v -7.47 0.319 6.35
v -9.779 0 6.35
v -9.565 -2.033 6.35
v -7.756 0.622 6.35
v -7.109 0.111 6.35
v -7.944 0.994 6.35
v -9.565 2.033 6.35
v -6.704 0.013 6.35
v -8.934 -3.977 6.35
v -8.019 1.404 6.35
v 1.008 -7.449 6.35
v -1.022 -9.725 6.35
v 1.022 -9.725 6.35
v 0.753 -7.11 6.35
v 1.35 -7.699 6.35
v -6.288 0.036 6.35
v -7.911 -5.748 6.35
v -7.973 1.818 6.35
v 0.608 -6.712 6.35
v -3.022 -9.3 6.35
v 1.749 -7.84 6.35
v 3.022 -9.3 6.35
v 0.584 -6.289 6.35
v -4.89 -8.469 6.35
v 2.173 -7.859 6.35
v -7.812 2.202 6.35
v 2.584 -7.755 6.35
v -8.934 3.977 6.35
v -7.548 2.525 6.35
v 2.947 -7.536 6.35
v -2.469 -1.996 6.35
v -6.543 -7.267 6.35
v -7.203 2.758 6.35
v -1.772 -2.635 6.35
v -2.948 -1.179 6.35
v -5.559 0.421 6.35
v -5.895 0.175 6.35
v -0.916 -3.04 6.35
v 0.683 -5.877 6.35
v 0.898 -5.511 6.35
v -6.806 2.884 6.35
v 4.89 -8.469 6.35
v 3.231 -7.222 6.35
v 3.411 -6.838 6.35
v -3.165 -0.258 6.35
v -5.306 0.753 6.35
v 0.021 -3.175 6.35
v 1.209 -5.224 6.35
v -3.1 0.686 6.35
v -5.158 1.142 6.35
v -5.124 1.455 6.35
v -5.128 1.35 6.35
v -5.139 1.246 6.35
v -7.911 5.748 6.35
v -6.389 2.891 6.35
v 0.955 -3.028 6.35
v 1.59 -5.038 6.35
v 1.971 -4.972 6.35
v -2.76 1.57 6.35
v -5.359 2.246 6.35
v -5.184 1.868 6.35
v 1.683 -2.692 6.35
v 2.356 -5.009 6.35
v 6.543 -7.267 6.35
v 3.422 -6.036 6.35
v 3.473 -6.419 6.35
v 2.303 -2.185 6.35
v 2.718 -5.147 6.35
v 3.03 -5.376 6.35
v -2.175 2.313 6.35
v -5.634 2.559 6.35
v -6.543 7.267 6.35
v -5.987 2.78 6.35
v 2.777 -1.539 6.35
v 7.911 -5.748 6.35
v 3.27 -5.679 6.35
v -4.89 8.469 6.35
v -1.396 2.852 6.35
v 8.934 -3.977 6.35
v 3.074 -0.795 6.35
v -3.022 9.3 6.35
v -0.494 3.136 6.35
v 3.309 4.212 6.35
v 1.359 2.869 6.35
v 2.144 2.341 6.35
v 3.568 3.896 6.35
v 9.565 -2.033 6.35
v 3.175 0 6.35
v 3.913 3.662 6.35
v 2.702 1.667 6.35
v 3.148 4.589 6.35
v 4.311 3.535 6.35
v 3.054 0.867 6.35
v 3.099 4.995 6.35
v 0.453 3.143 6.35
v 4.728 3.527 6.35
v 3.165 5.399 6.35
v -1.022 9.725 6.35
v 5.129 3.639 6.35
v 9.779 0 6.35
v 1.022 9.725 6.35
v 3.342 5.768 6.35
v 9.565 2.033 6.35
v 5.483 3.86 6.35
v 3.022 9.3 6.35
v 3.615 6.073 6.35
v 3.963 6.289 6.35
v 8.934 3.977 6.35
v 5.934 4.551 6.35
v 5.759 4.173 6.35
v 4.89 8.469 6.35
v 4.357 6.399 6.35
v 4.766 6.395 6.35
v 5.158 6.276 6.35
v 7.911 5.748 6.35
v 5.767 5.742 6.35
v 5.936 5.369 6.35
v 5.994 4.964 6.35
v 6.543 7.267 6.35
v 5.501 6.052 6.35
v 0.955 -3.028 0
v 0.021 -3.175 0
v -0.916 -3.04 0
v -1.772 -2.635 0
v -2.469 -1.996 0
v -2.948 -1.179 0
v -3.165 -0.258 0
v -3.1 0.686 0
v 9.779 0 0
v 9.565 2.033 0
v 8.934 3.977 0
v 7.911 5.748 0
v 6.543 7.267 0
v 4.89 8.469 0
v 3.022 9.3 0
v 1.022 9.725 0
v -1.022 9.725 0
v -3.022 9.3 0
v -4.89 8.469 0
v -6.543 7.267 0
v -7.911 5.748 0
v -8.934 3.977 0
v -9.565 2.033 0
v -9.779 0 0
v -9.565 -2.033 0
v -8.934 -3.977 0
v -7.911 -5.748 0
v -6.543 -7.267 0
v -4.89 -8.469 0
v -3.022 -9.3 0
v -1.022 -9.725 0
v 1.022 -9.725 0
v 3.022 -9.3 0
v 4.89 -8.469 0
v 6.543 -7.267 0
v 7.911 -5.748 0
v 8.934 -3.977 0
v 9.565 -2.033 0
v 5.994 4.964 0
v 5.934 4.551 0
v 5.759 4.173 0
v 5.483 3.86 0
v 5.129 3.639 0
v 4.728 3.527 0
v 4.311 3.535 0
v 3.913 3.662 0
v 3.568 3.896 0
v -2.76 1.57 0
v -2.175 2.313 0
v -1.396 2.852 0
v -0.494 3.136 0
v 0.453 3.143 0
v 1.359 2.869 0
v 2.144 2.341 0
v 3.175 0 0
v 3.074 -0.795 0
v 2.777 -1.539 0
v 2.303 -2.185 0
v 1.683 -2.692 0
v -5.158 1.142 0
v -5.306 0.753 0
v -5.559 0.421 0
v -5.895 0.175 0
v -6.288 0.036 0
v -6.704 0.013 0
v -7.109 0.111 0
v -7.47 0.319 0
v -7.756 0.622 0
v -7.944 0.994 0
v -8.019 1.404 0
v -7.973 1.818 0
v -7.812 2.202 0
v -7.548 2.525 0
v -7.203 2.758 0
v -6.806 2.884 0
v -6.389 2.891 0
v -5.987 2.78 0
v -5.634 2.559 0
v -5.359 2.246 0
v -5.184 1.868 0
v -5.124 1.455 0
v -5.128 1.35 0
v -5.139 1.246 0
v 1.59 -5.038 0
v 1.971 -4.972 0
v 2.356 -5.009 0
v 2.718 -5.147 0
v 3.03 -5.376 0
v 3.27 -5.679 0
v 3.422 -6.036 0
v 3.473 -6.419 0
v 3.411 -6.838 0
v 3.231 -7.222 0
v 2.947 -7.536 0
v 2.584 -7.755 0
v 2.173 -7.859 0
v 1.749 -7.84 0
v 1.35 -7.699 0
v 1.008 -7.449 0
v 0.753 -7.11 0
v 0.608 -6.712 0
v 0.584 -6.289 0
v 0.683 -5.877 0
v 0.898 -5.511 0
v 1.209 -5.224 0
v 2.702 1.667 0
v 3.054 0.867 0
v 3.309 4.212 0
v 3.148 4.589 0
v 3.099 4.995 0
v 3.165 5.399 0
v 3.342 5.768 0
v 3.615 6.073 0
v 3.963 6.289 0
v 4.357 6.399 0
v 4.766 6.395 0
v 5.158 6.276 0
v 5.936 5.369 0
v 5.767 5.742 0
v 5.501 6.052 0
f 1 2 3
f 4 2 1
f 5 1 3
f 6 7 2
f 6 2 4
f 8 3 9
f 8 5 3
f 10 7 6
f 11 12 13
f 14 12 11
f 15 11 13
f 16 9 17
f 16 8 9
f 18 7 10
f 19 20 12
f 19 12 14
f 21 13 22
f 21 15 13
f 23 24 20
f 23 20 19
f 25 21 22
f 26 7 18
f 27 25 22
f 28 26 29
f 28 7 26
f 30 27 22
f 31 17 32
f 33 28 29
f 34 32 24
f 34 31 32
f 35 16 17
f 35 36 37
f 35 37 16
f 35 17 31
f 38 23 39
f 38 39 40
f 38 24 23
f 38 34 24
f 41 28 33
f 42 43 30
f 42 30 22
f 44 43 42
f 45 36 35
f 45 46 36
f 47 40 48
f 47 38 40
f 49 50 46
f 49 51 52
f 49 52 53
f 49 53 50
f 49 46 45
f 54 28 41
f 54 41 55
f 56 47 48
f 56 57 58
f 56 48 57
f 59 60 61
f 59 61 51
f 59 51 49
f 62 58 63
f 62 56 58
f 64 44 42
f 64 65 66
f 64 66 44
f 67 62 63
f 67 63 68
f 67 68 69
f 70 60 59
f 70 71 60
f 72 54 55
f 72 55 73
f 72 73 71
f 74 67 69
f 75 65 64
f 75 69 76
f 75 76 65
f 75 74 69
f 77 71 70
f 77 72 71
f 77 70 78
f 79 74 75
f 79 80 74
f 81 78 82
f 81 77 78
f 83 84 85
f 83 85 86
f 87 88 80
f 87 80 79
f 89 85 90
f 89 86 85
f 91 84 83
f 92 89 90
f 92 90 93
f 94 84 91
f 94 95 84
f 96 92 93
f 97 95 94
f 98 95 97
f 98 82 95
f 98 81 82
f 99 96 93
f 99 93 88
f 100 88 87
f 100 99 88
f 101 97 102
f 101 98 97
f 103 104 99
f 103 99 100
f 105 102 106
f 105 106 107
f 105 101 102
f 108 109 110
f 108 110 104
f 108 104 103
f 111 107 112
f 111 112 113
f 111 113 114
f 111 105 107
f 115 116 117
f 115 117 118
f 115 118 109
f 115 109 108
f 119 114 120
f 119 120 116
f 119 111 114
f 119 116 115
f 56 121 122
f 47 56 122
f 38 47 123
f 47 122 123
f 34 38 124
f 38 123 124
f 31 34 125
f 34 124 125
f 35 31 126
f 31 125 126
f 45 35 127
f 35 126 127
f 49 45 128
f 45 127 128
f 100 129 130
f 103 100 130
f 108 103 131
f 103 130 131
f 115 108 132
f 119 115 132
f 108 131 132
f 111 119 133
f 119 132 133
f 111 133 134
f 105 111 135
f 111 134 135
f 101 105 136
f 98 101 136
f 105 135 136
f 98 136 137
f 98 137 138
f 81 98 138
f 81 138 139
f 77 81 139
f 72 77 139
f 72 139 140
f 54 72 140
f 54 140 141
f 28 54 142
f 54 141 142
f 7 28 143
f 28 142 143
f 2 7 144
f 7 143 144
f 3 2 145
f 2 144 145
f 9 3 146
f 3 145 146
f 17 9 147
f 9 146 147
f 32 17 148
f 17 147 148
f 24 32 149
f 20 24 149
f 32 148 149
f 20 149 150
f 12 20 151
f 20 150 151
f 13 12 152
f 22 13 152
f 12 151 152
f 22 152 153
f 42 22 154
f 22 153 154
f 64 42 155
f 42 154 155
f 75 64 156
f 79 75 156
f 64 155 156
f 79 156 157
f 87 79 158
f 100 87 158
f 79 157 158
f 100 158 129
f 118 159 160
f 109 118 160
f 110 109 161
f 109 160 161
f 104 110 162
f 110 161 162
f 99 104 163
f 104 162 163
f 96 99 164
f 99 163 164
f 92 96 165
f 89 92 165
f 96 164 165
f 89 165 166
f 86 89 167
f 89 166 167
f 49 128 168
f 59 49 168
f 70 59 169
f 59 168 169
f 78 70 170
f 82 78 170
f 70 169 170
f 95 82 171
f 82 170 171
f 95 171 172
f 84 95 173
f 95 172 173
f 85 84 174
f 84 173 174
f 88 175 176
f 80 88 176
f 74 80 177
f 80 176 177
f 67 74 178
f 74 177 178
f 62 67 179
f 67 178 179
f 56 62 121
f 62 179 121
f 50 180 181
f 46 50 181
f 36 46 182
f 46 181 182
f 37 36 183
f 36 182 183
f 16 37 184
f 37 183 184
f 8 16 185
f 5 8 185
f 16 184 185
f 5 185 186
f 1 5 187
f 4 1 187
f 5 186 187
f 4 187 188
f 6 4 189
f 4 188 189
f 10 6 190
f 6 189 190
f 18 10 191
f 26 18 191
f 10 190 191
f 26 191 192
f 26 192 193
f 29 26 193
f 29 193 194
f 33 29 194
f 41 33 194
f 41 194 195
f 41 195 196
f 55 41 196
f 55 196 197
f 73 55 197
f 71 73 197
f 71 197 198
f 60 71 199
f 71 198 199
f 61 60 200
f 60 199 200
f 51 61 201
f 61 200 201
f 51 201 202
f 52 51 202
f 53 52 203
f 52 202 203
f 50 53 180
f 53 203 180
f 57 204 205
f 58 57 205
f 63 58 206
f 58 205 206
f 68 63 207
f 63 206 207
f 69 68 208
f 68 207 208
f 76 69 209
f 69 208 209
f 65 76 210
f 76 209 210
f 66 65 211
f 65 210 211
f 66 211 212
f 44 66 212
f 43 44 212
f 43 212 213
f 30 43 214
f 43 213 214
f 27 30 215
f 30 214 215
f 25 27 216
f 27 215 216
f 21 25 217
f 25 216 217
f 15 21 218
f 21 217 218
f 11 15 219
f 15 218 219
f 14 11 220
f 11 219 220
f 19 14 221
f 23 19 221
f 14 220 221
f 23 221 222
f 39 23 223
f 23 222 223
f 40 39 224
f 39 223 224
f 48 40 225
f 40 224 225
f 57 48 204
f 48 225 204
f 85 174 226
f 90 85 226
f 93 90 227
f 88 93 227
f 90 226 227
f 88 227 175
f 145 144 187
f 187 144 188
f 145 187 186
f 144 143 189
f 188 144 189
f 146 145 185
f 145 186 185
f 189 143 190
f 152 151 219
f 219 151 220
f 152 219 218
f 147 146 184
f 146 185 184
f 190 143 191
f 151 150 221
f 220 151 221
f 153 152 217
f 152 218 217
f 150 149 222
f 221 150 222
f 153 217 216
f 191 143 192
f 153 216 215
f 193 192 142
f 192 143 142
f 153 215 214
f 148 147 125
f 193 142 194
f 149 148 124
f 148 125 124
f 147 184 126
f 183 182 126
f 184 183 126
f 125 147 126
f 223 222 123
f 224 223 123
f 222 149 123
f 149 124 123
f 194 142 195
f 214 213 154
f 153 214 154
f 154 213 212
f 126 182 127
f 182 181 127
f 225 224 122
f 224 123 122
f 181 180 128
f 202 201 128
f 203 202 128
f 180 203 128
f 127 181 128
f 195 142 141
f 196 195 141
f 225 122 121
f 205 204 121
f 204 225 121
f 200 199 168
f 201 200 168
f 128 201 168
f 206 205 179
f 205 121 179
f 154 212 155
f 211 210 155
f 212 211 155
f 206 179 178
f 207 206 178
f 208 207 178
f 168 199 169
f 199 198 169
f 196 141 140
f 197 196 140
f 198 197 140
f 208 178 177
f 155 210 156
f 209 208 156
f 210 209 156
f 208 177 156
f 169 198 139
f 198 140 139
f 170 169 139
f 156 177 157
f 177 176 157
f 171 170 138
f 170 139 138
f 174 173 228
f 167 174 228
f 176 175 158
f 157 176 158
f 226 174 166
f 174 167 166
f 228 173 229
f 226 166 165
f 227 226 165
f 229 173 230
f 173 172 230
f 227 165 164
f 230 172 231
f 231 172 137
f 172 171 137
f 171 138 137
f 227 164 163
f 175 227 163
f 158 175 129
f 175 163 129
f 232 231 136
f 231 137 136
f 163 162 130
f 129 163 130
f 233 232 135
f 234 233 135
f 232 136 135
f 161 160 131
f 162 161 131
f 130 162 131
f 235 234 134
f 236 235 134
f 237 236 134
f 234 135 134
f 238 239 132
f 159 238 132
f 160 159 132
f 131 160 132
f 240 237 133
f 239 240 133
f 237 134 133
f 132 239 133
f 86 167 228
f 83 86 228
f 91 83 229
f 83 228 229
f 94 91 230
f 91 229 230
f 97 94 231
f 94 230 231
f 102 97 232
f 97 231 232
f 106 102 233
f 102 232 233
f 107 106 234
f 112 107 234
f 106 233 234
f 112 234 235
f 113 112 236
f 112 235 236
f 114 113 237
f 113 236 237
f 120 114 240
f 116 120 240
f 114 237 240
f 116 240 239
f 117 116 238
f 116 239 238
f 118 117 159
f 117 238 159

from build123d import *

# Parameters (mm, degrees)
F0_R     = 9.779
F1_DEPTH = 6.35


with BuildPart() as f1:
    # F0 (on Top) → F1 (new body)
    with BuildSketch(Plane.XY):
        Circle(F0_R)
        with BuildLine():
            ThreePointArc((3.473407, -6.418978), (1.16965, -7.586652), (1.58991, -5.038292))
            ThreePointArc((1.58991, -5.038292), (2.881563, -5.251304), (3.473407, -6.418978))
        make_face(mode=Mode.SUBTRACT)
        with BuildLine():
            ThreePointArc((-5.124001, 1.455262), (-5.132588, 1.297819), (-5.158244, 1.142243))
            ThreePointArc((-5.158244, 1.142243), (-8.011015, 1.612705), (-5.124001, 1.455262))
        make_face(mode=Mode.SUBTRACT)
        with BuildLine():
            ThreePointArc((2.144431, 2.341375), (2.905959, 1.279073), (3.175, 0))
            ThreePointArc((3.175, 0), (2.560689, -1.877098), (0.955475, -3.02782))
            ThreePointArc((0.955475, -3.02782), (-2.144431, -2.341375), (-3.099906, 0.686444))
            ThreePointArc((-3.099906, 0.686444), (-0.955475, 3.02782), (2.144431, 2.341375))
        make_face(mode=Mode.SUBTRACT)
        with BuildLine():
            ThreePointArc((5.993995, 4.963716), (5.129452, 3.638599), (3.568334, 3.896049))
            ThreePointArc((3.568334, 3.896049), (3.962937, 6.288833), (5.993995, 4.963716))
        make_face(mode=Mode.SUBTRACT)
    extrude(amount=F1_DEPTH)


solid = f1.part
